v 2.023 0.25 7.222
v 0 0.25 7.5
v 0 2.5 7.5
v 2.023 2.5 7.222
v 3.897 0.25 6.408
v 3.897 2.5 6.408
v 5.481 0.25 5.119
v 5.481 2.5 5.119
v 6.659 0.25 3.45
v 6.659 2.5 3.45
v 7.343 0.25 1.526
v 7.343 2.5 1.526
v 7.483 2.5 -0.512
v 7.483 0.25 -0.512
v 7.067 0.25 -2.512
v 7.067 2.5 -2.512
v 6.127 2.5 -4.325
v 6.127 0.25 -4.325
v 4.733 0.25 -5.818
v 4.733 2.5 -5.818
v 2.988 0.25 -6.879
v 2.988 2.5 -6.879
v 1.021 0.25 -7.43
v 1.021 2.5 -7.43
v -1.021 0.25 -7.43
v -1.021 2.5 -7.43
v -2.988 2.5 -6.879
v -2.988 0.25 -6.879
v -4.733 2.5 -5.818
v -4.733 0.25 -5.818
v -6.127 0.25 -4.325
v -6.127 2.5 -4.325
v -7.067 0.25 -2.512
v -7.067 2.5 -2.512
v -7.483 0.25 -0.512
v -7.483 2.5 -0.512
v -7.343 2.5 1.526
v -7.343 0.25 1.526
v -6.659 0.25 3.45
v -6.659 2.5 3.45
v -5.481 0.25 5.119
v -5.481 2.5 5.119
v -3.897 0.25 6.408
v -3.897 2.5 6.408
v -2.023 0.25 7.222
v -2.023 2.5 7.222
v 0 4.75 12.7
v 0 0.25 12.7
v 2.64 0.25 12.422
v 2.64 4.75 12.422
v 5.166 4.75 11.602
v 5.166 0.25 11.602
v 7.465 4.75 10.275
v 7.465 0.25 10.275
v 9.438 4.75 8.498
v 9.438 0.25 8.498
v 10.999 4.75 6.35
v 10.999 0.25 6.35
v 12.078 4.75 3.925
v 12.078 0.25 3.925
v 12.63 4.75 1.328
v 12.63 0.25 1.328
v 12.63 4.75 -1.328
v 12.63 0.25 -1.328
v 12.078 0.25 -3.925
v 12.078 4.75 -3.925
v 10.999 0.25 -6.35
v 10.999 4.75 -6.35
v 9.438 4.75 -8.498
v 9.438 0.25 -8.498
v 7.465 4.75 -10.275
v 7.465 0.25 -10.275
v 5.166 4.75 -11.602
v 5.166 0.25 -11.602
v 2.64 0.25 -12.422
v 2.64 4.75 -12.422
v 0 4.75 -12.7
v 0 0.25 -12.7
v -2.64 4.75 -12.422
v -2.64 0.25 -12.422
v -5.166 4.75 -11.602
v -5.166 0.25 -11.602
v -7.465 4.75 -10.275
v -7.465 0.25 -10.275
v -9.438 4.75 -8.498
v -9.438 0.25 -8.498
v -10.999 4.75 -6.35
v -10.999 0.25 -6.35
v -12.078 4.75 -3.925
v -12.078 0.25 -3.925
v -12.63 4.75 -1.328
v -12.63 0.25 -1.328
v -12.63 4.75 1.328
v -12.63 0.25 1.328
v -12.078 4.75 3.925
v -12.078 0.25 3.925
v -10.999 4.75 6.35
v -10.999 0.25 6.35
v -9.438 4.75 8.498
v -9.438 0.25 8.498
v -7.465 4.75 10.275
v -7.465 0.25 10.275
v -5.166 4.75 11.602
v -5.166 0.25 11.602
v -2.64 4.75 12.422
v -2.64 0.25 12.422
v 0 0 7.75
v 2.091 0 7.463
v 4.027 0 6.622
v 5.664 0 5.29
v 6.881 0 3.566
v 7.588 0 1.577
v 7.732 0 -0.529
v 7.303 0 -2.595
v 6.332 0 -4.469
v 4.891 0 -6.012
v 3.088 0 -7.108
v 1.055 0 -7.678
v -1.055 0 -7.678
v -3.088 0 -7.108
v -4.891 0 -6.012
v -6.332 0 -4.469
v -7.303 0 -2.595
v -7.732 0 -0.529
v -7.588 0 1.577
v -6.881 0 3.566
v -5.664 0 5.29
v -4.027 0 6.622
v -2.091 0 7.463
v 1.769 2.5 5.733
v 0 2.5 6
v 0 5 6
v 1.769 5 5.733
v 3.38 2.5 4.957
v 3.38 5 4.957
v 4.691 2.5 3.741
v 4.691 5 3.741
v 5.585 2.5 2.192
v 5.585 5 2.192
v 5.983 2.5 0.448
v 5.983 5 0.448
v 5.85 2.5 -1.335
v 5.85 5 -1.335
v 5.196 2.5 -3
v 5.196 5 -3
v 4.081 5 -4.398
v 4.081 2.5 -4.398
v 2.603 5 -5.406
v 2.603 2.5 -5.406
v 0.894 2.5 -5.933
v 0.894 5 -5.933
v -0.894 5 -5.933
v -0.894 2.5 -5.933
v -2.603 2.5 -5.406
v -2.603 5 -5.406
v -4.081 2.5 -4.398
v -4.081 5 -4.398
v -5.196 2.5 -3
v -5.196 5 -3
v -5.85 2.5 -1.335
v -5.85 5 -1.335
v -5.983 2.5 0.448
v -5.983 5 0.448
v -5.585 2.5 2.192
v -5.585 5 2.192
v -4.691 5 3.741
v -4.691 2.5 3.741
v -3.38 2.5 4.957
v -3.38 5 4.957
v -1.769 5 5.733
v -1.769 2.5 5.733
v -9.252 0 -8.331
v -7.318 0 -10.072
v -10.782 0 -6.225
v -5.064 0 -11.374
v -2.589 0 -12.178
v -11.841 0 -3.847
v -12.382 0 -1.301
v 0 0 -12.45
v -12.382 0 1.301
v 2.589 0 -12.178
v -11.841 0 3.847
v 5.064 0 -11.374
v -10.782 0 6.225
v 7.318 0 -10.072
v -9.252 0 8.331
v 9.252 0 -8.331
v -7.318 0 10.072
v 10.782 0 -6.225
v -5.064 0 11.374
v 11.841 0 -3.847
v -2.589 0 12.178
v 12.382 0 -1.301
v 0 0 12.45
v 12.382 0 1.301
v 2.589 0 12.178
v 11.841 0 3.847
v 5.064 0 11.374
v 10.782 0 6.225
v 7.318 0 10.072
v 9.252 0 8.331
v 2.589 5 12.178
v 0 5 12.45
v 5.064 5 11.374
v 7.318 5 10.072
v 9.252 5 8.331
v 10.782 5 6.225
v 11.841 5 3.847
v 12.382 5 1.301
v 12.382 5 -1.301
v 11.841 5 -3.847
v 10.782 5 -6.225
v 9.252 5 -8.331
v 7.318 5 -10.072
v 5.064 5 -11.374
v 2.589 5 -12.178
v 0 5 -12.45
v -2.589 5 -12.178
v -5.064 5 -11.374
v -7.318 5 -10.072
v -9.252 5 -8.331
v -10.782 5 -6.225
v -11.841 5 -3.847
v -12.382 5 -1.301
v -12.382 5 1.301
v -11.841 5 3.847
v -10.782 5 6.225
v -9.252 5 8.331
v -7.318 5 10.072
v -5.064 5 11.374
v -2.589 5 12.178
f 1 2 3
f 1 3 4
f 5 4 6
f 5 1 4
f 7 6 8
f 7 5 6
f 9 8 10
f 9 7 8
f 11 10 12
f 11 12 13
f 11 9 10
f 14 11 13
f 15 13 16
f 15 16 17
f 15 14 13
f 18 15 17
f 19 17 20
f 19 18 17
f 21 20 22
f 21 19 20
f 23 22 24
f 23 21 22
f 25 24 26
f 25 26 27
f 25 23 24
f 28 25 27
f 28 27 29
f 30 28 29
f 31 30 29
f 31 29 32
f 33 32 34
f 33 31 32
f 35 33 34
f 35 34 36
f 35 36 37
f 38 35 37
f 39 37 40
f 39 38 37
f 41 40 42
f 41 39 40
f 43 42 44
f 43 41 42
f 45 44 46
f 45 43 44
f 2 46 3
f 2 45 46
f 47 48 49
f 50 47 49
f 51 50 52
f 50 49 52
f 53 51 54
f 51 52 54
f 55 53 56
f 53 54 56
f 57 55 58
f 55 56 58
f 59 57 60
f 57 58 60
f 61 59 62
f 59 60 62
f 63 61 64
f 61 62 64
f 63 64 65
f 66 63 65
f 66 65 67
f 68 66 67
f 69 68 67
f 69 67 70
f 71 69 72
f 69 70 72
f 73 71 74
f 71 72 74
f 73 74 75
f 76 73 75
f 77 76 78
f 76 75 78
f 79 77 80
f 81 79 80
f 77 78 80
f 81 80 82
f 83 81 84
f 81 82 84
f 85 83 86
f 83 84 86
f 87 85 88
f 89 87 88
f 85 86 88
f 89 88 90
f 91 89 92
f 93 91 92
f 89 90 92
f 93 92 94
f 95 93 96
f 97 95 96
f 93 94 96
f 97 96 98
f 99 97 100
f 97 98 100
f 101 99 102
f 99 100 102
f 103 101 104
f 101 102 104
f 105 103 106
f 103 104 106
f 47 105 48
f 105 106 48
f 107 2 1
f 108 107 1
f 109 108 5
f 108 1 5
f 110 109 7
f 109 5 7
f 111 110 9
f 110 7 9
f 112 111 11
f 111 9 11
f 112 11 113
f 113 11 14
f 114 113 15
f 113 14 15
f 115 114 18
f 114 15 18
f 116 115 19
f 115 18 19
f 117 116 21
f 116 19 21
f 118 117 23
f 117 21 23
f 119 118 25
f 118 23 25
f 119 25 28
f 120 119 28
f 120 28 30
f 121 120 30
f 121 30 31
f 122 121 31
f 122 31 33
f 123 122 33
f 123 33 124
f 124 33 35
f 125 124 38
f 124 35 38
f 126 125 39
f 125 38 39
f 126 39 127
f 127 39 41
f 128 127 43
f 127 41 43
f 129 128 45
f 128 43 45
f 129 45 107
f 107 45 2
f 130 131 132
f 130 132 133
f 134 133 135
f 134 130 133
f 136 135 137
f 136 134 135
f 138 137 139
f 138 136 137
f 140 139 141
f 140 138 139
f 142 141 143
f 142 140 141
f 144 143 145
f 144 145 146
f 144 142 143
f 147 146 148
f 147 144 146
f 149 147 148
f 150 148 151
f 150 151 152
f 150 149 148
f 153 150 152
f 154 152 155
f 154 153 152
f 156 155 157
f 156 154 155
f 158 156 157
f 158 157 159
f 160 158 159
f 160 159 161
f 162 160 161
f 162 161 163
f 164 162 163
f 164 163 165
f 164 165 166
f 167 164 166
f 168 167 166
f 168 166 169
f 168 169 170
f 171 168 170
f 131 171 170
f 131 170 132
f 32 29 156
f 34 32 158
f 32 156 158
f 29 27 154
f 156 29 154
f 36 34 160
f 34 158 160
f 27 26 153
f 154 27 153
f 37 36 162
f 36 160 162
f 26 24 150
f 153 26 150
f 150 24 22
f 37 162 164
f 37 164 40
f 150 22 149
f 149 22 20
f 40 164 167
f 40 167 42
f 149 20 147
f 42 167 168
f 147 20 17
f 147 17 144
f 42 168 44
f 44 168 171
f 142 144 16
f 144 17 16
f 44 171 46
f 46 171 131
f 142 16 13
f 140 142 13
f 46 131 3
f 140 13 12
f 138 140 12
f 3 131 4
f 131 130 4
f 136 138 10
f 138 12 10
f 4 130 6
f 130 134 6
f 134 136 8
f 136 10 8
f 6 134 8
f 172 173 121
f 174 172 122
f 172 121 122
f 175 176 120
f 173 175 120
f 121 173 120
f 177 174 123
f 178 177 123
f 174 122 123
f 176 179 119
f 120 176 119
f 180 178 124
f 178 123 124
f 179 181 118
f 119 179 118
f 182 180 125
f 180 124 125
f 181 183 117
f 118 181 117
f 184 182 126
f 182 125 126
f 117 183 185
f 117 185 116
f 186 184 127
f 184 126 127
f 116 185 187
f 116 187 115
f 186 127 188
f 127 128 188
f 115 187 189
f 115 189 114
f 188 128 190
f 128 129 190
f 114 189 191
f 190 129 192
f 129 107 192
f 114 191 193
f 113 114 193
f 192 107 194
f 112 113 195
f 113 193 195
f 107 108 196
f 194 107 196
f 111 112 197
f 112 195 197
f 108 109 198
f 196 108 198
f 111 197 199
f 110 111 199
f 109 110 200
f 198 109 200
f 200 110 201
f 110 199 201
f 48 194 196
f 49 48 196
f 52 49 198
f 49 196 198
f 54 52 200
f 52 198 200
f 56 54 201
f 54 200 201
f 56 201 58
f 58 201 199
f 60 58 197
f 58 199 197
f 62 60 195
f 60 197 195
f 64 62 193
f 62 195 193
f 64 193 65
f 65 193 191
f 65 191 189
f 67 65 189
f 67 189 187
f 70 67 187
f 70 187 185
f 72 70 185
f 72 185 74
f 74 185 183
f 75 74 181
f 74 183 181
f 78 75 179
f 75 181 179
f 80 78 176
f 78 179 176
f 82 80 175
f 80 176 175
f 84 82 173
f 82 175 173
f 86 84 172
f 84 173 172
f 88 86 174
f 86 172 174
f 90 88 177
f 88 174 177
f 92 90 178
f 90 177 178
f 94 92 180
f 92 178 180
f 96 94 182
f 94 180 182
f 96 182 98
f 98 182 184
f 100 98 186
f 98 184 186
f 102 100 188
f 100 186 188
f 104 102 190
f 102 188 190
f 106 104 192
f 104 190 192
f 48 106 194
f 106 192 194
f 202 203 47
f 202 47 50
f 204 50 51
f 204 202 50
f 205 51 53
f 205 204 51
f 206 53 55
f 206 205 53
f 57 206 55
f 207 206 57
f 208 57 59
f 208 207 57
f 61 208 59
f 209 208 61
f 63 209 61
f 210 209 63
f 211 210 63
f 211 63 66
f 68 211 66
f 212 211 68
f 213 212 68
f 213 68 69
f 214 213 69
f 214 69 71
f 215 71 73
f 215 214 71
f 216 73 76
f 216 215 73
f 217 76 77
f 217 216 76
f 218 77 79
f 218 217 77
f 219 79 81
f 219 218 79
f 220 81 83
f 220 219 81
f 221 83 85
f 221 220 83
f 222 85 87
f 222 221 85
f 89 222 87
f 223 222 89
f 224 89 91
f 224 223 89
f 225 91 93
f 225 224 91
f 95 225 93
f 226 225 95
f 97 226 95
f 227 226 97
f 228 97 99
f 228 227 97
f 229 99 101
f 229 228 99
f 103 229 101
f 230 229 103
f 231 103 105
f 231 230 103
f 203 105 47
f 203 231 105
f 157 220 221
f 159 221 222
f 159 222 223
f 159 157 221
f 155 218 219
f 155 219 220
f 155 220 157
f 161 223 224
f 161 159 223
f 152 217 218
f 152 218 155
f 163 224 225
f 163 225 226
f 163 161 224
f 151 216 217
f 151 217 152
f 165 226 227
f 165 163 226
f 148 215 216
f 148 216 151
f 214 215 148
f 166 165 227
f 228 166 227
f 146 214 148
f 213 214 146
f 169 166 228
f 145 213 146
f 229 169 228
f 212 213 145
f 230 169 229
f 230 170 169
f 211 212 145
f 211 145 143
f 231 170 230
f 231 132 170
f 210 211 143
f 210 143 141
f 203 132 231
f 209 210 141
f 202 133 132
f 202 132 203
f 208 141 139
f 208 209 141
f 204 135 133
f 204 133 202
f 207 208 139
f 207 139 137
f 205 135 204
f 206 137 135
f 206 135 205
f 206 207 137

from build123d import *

# Parameters (mm, degrees)
SKETCH1_R           = 12.7
BOSS_EXTRUDE1_DEPTH = 5
SKETCH1_3_R         = 6
CUT_EXTRUDE1_DEPTH  = 5
SKETCH1_4_R         = 7.5
SKETCH1_4_R_2       = 6
CUT_EXTRUDE2_DEPTH  = 2.5
CHAMFER1_SIZE       = 0.25


with BuildPart() as part:
    # Sketch1 → Boss-Extrude1 (new body)
    with BuildSketch(Plane(origin=(0, 0, 0), x_dir=(1, 0, 0), z_dir=(0, 1, 0))):
        with Locations(Location((0, 0, 0), (0, 0, 270))):
            Circle(SKETCH1_R)
    extrude(amount=BOSS_EXTRUDE1_DEPTH)

    # Sketch1<3> → Cut-Extrude1 (cut)
    with BuildSketch(Plane(origin=(0, 0, 0), x_dir=(1, 0, 0), z_dir=(0, 1, 0))):
        with Locations(Location((0, 0, 0), (0, 0, 270))):
            Circle(SKETCH1_3_R)
    extrude(amount=CUT_EXTRUDE1_DEPTH, mode=Mode.SUBTRACT)

    # Sketch1<4> → Cut-Extrude2 (cut)
    with BuildSketch(Plane(origin=(0, 0, 0), x_dir=(1, 0, 0), z_dir=(0, 1, 0))):
        with Locations(Location((0, 0, 0), (0, 0, 270))):
            Circle(SKETCH1_4_R)
        with Locations(Location((0, 0, 0), (0, 0, 270))):
            Circle(SKETCH1_4_R_2, mode=Mode.SUBTRACT)
    extrude(amount=CUT_EXTRUDE2_DEPTH, mode=Mode.SUBTRACT)

    # Chamfer1
    chamfer1_edges = [part.edges().sort_by_distance(p)[0] for p in [
        (0, 0, -7.5),
        (0, 0, -12.7),
        (0, 5, -12.7),
    ]]
    chamfer(chamfer1_edges, length=CHAMFER1_SIZE)


solid = part.part
